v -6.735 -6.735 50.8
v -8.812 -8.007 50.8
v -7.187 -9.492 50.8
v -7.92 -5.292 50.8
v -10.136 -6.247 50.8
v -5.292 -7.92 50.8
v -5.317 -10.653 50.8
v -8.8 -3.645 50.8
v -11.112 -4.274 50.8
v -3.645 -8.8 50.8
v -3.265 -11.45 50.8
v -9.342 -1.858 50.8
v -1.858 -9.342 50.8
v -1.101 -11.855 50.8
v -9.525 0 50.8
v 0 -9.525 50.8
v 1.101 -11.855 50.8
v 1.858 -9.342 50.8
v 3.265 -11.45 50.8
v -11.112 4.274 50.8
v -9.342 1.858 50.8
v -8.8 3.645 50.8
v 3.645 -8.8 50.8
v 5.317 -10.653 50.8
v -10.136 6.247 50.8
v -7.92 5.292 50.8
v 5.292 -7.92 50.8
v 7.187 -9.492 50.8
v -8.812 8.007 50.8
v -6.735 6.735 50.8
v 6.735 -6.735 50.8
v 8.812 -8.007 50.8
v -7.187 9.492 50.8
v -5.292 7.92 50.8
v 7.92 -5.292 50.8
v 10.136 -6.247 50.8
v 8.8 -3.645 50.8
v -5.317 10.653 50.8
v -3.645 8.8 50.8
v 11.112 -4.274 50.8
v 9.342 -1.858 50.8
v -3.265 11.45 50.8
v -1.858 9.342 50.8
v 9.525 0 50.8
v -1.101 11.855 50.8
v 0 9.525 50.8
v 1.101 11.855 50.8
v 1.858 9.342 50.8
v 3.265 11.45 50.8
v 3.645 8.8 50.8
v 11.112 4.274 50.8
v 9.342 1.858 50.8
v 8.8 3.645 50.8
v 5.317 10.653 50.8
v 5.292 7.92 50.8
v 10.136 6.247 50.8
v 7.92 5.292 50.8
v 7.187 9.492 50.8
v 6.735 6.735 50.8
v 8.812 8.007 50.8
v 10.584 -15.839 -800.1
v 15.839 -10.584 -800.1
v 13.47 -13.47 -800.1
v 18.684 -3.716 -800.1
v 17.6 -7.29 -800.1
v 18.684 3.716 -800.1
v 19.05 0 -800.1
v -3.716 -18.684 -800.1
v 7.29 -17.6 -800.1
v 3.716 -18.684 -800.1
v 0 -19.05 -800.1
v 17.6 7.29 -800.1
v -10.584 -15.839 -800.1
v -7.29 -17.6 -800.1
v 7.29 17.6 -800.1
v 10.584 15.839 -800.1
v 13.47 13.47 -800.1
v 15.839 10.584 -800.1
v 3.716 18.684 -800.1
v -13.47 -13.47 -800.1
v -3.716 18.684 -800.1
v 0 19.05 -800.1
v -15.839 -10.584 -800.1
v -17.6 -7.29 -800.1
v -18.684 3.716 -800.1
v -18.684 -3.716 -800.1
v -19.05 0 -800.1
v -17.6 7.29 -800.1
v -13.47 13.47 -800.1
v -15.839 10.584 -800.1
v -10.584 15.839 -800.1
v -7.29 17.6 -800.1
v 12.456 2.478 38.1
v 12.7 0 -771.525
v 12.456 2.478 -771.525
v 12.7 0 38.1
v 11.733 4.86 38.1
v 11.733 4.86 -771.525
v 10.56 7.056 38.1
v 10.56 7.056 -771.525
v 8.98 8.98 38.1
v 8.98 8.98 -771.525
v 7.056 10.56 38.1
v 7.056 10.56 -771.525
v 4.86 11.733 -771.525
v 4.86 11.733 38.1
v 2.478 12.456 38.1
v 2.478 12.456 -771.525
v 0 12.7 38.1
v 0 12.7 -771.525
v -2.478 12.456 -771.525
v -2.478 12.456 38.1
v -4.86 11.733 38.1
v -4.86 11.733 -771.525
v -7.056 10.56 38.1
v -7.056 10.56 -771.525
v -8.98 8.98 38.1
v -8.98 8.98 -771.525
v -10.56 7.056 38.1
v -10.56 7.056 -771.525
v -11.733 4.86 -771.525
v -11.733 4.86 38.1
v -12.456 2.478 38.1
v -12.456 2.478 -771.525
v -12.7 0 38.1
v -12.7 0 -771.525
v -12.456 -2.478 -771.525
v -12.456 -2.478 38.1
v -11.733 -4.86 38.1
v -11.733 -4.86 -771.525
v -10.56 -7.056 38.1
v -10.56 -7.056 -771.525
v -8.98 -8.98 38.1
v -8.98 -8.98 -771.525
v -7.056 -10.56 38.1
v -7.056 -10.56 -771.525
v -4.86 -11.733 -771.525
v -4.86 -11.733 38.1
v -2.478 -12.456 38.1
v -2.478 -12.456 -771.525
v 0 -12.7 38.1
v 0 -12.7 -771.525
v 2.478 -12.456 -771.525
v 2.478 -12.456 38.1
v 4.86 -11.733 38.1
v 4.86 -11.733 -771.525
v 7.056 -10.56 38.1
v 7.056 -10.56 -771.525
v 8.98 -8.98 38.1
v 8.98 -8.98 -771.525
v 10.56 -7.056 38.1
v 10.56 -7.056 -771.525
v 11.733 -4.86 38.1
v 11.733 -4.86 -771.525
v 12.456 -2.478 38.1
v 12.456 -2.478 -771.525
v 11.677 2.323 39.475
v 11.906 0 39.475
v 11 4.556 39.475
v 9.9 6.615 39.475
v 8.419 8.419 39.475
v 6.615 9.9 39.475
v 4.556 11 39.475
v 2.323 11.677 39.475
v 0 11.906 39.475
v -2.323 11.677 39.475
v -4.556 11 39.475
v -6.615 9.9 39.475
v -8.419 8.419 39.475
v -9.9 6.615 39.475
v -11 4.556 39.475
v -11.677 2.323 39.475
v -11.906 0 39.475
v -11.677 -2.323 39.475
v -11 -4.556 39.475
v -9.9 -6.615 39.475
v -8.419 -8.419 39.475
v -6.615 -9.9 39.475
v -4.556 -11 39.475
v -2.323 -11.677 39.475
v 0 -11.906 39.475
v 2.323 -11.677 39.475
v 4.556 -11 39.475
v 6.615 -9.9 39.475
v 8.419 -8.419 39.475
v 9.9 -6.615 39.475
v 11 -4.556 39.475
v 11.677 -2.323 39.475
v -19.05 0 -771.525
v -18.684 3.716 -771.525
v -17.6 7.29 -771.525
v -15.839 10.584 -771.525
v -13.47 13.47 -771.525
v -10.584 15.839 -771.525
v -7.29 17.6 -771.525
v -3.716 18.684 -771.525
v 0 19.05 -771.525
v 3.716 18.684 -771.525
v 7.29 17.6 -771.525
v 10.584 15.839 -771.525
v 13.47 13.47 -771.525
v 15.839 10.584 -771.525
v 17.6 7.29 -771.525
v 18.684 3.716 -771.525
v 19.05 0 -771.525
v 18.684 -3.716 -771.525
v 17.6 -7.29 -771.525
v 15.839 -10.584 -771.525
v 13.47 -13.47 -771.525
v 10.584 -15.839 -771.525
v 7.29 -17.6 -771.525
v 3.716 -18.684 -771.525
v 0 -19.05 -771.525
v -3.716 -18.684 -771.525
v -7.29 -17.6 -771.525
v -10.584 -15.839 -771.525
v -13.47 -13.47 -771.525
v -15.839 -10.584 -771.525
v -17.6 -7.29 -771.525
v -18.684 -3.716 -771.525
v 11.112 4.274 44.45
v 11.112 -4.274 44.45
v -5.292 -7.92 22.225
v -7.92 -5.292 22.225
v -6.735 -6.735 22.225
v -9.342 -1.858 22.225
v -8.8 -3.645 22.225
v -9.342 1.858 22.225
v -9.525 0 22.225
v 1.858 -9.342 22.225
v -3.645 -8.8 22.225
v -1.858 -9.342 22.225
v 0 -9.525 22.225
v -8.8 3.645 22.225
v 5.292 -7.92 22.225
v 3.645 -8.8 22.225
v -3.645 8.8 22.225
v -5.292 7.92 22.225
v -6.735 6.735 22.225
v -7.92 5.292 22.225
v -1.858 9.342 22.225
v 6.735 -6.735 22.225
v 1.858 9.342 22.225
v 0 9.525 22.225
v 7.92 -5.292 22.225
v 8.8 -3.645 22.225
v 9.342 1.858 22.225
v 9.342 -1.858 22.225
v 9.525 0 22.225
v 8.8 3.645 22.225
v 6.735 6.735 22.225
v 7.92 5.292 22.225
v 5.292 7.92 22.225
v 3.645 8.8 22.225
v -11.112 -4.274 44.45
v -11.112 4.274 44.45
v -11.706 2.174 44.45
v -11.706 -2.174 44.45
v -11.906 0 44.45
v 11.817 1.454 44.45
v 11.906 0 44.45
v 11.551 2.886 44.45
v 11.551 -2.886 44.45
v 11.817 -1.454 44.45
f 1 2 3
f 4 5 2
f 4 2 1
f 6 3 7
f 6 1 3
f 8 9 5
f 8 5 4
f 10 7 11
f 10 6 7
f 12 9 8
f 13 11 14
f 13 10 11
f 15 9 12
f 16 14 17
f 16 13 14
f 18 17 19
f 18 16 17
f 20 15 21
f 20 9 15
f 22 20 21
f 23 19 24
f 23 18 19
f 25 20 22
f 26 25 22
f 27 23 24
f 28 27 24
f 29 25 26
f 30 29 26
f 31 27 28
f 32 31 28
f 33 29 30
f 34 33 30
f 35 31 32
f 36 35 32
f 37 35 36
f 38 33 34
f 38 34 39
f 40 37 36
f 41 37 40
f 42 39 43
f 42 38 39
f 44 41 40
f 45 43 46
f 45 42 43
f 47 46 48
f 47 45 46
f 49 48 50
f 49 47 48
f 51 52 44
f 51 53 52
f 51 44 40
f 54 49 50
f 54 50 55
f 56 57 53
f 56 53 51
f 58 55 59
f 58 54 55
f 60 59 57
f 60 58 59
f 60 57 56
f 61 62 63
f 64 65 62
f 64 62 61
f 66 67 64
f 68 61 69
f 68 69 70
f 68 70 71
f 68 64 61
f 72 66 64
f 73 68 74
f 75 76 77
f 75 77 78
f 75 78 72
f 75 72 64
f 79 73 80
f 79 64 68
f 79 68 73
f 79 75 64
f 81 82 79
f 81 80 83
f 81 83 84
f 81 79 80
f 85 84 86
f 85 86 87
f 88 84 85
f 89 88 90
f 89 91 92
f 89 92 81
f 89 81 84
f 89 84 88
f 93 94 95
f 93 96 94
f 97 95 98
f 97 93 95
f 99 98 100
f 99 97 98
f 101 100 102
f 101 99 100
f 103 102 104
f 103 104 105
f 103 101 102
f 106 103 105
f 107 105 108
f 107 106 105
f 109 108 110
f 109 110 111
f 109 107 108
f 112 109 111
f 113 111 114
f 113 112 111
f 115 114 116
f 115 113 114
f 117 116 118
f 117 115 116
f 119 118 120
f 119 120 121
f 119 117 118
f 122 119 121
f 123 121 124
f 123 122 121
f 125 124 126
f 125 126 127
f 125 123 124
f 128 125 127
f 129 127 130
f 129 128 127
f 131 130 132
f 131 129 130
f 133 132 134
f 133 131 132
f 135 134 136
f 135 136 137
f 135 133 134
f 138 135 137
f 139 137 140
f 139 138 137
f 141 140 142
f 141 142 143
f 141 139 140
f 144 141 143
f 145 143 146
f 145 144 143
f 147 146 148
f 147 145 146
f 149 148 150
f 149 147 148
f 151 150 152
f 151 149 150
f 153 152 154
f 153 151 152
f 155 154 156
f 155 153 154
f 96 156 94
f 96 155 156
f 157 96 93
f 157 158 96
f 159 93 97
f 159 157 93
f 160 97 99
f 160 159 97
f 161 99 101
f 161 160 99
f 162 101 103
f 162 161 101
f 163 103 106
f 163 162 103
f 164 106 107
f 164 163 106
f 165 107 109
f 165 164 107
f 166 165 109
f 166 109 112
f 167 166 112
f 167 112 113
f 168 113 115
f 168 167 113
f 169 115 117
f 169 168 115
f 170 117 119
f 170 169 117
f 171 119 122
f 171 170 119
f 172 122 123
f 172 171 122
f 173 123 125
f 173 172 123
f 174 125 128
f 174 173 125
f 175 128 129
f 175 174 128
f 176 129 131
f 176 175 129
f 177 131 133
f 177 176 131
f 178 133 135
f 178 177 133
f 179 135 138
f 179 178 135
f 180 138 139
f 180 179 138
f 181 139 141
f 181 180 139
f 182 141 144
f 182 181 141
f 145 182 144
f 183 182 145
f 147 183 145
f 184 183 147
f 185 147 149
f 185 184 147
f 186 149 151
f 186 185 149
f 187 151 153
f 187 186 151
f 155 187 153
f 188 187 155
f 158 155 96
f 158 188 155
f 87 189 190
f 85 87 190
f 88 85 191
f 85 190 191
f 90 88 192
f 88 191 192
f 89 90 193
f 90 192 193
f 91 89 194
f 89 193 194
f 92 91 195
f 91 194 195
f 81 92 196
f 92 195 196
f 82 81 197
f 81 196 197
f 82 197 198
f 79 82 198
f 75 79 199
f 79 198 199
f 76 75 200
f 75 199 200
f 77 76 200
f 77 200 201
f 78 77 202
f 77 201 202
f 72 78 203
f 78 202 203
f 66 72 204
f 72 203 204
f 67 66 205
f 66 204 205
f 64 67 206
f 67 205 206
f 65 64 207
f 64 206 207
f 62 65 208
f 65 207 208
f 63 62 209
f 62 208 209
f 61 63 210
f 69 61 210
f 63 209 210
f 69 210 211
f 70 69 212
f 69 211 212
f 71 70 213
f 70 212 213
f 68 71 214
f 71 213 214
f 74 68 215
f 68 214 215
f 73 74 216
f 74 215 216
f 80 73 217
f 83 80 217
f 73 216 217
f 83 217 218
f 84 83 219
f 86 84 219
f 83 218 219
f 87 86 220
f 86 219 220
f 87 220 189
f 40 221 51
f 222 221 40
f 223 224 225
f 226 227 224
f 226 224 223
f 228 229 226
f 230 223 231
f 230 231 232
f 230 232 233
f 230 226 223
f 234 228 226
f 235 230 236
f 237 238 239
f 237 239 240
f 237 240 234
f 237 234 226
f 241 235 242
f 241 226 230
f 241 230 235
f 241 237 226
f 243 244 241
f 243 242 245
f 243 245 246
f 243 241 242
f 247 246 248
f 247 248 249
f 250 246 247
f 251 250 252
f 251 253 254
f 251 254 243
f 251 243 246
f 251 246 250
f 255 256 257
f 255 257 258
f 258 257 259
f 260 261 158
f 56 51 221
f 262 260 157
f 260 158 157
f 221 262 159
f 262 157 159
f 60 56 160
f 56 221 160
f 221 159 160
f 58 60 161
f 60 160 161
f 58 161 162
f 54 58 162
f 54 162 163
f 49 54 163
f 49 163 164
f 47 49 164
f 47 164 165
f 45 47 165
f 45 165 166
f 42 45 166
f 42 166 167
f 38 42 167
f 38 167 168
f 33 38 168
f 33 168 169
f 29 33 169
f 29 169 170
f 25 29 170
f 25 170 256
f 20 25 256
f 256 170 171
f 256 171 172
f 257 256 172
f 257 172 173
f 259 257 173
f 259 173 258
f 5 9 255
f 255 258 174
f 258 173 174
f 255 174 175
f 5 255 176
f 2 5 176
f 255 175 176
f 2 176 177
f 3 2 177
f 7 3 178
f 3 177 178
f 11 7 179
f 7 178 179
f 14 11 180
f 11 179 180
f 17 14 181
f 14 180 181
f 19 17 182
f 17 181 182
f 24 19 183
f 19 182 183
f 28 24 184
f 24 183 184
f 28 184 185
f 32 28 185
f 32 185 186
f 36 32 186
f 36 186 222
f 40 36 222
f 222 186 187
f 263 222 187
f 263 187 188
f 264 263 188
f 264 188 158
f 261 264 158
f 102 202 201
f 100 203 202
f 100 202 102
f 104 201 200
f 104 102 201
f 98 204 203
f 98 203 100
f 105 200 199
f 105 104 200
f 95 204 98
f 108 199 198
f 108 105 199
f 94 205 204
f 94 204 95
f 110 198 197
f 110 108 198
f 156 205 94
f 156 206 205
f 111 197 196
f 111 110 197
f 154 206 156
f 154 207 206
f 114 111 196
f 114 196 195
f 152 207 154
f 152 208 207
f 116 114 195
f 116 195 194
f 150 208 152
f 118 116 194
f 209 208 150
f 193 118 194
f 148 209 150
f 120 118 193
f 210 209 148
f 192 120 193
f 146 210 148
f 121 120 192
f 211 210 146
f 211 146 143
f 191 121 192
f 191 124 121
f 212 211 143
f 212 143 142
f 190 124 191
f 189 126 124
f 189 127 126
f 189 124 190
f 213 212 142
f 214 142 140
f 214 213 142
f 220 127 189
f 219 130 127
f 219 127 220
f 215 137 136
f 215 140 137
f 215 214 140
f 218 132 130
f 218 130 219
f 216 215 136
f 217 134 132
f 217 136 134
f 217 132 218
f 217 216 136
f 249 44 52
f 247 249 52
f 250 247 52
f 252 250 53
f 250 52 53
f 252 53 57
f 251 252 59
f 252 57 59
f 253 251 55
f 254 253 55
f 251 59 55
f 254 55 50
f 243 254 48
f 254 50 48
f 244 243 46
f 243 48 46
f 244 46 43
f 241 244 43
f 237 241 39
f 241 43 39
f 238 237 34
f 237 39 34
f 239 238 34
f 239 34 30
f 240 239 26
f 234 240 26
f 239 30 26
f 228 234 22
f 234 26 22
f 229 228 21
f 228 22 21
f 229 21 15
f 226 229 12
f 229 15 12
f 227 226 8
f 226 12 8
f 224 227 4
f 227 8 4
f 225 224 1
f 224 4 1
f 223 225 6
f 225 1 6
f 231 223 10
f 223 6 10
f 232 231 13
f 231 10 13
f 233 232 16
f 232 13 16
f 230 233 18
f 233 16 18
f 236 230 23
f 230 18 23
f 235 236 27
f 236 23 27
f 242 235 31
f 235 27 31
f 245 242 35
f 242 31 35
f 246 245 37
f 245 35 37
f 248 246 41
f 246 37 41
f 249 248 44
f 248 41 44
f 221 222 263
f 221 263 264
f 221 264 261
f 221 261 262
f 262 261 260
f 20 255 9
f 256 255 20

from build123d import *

# Parameters (mm, degrees)
SKETCH1_W           = 19.05
SKETCH1_H           = 28.575
SKETCH2_R           = 12.7
BOSS_EXTRUDE1_DEPTH = 695.325
SKETCH3_R           = 12.7
BOSS_EXTRUDE2_DEPTH = 1.374815329
BOSS_EXTRUDE2_TAPER = 30
SKETCH4_R           = 11.90625
BOSS_EXTRUDE3_DEPTH = 11.325184671
CUT_EXTRUDE1_START  = -6.35
CUT_EXTRUDE1_DEPTH  = 6.35
CUT_EXTRUDE2_START  = -6.35
CUT_EXTRUDE2_DEPTH  = 6.35
SKETCH10_R          = 9.525
CUT_EXTRUDE4_DEPTH  = 28.575
SKETCH8_R           = 19.05
BOSS_EXTRUDE5_DEPTH = 114.3
SKETCH9_R           = 19.05
SKETCH9_R_2         = 12.7
CUT_EXTRUDE3_DEPTH  = 114.3


with BuildPart() as part:
    # Sketch1 → Revolve1 (revolve)
    with BuildSketch(Plane.XZ, mode=Mode.PRIVATE) as revolve1_sk:
        with Locations((9.525, -671.5125)):
            Rectangle(SKETCH1_W, SKETCH1_H)
    revolve(revolve1_sk.sketch.rotate(Axis((0, 0, -657.225), (0, 0, -1)), 180), axis=Axis((0, 0, -657.225), (0, 0, -1)))

    # Sketch2 → Boss-Extrude1 (add)
    with BuildSketch(Plane.XY.offset(-657.225)):
        Circle(SKETCH2_R)
    extrude(amount=BOSS_EXTRUDE1_DEPTH)

    # Sketch3 → Boss-Extrude2 (add)
    with BuildSketch(Plane.XY.offset(38.1)):
        Circle(SKETCH3_R)
    extrude(amount=BOSS_EXTRUDE2_DEPTH, taper=BOSS_EXTRUDE2_TAPER)

    # Sketch4 → Boss-Extrude3 (add)
    with BuildSketch(Plane.XY.offset(39.474815329)):
        Circle(SKETCH4_R)
    extrude(amount=BOSS_EXTRUDE3_DEPTH)

    # Sketch5 → Cut-Extrude1 (cut)
    with BuildSketch(Plane.XY.offset(50.8).offset(CUT_EXTRUDE1_START)):
        with BuildLine():
            Line((11.1125, 4.274474566), (11.1125, -4.274474566))
            ThreePointArc((11.1125, -4.274474566), (11.90625, 0), (11.1125, 4.274474566))
        make_face()
    extrude(amount=CUT_EXTRUDE1_DEPTH, mode=Mode.SUBTRACT)

    # Sketch6 → Cut-Extrude2 (cut)
    with BuildSketch(Plane.XY.offset(50.8).offset(CUT_EXTRUDE2_START)):
        with BuildLine():
            Line((-11.1125, -4.274474566), (-11.1125, 4.274474566))
            ThreePointArc((-11.1125, 4.274474566), (-11.90625, 0), (-11.1125, -4.274474566))
        make_face()
    extrude(amount=CUT_EXTRUDE2_DEPTH, mode=Mode.SUBTRACT)

    # Sketch10 → Cut-Extrude4 (cut)
    with BuildSketch(Plane.XY.offset(50.8)):
        Circle(SKETCH10_R)
    extrude(amount=-CUT_EXTRUDE4_DEPTH, mode=Mode.SUBTRACT)

    # Sketch8 → Boss-Extrude5 (add)
    with BuildSketch(Plane(origin=(0, 0, -685.8), x_dir=(-1, 0, 0), z_dir=(0, 0, -1))):
        Circle(SKETCH8_R)
    extrude(amount=BOSS_EXTRUDE5_DEPTH)

    # Sketch9 → Cut-Extrude3 (cut)
    with BuildSketch(Plane.XY.offset(-657.225)):
        with Locations(Location((0, 0, 0), (0, 0, 180))):
            Circle(SKETCH9_R)
        Circle(SKETCH9_R_2, mode=Mode.SUBTRACT)
    extrude(amount=-CUT_EXTRUDE3_DEPTH, mode=Mode.SUBTRACT)


solid = part.part
